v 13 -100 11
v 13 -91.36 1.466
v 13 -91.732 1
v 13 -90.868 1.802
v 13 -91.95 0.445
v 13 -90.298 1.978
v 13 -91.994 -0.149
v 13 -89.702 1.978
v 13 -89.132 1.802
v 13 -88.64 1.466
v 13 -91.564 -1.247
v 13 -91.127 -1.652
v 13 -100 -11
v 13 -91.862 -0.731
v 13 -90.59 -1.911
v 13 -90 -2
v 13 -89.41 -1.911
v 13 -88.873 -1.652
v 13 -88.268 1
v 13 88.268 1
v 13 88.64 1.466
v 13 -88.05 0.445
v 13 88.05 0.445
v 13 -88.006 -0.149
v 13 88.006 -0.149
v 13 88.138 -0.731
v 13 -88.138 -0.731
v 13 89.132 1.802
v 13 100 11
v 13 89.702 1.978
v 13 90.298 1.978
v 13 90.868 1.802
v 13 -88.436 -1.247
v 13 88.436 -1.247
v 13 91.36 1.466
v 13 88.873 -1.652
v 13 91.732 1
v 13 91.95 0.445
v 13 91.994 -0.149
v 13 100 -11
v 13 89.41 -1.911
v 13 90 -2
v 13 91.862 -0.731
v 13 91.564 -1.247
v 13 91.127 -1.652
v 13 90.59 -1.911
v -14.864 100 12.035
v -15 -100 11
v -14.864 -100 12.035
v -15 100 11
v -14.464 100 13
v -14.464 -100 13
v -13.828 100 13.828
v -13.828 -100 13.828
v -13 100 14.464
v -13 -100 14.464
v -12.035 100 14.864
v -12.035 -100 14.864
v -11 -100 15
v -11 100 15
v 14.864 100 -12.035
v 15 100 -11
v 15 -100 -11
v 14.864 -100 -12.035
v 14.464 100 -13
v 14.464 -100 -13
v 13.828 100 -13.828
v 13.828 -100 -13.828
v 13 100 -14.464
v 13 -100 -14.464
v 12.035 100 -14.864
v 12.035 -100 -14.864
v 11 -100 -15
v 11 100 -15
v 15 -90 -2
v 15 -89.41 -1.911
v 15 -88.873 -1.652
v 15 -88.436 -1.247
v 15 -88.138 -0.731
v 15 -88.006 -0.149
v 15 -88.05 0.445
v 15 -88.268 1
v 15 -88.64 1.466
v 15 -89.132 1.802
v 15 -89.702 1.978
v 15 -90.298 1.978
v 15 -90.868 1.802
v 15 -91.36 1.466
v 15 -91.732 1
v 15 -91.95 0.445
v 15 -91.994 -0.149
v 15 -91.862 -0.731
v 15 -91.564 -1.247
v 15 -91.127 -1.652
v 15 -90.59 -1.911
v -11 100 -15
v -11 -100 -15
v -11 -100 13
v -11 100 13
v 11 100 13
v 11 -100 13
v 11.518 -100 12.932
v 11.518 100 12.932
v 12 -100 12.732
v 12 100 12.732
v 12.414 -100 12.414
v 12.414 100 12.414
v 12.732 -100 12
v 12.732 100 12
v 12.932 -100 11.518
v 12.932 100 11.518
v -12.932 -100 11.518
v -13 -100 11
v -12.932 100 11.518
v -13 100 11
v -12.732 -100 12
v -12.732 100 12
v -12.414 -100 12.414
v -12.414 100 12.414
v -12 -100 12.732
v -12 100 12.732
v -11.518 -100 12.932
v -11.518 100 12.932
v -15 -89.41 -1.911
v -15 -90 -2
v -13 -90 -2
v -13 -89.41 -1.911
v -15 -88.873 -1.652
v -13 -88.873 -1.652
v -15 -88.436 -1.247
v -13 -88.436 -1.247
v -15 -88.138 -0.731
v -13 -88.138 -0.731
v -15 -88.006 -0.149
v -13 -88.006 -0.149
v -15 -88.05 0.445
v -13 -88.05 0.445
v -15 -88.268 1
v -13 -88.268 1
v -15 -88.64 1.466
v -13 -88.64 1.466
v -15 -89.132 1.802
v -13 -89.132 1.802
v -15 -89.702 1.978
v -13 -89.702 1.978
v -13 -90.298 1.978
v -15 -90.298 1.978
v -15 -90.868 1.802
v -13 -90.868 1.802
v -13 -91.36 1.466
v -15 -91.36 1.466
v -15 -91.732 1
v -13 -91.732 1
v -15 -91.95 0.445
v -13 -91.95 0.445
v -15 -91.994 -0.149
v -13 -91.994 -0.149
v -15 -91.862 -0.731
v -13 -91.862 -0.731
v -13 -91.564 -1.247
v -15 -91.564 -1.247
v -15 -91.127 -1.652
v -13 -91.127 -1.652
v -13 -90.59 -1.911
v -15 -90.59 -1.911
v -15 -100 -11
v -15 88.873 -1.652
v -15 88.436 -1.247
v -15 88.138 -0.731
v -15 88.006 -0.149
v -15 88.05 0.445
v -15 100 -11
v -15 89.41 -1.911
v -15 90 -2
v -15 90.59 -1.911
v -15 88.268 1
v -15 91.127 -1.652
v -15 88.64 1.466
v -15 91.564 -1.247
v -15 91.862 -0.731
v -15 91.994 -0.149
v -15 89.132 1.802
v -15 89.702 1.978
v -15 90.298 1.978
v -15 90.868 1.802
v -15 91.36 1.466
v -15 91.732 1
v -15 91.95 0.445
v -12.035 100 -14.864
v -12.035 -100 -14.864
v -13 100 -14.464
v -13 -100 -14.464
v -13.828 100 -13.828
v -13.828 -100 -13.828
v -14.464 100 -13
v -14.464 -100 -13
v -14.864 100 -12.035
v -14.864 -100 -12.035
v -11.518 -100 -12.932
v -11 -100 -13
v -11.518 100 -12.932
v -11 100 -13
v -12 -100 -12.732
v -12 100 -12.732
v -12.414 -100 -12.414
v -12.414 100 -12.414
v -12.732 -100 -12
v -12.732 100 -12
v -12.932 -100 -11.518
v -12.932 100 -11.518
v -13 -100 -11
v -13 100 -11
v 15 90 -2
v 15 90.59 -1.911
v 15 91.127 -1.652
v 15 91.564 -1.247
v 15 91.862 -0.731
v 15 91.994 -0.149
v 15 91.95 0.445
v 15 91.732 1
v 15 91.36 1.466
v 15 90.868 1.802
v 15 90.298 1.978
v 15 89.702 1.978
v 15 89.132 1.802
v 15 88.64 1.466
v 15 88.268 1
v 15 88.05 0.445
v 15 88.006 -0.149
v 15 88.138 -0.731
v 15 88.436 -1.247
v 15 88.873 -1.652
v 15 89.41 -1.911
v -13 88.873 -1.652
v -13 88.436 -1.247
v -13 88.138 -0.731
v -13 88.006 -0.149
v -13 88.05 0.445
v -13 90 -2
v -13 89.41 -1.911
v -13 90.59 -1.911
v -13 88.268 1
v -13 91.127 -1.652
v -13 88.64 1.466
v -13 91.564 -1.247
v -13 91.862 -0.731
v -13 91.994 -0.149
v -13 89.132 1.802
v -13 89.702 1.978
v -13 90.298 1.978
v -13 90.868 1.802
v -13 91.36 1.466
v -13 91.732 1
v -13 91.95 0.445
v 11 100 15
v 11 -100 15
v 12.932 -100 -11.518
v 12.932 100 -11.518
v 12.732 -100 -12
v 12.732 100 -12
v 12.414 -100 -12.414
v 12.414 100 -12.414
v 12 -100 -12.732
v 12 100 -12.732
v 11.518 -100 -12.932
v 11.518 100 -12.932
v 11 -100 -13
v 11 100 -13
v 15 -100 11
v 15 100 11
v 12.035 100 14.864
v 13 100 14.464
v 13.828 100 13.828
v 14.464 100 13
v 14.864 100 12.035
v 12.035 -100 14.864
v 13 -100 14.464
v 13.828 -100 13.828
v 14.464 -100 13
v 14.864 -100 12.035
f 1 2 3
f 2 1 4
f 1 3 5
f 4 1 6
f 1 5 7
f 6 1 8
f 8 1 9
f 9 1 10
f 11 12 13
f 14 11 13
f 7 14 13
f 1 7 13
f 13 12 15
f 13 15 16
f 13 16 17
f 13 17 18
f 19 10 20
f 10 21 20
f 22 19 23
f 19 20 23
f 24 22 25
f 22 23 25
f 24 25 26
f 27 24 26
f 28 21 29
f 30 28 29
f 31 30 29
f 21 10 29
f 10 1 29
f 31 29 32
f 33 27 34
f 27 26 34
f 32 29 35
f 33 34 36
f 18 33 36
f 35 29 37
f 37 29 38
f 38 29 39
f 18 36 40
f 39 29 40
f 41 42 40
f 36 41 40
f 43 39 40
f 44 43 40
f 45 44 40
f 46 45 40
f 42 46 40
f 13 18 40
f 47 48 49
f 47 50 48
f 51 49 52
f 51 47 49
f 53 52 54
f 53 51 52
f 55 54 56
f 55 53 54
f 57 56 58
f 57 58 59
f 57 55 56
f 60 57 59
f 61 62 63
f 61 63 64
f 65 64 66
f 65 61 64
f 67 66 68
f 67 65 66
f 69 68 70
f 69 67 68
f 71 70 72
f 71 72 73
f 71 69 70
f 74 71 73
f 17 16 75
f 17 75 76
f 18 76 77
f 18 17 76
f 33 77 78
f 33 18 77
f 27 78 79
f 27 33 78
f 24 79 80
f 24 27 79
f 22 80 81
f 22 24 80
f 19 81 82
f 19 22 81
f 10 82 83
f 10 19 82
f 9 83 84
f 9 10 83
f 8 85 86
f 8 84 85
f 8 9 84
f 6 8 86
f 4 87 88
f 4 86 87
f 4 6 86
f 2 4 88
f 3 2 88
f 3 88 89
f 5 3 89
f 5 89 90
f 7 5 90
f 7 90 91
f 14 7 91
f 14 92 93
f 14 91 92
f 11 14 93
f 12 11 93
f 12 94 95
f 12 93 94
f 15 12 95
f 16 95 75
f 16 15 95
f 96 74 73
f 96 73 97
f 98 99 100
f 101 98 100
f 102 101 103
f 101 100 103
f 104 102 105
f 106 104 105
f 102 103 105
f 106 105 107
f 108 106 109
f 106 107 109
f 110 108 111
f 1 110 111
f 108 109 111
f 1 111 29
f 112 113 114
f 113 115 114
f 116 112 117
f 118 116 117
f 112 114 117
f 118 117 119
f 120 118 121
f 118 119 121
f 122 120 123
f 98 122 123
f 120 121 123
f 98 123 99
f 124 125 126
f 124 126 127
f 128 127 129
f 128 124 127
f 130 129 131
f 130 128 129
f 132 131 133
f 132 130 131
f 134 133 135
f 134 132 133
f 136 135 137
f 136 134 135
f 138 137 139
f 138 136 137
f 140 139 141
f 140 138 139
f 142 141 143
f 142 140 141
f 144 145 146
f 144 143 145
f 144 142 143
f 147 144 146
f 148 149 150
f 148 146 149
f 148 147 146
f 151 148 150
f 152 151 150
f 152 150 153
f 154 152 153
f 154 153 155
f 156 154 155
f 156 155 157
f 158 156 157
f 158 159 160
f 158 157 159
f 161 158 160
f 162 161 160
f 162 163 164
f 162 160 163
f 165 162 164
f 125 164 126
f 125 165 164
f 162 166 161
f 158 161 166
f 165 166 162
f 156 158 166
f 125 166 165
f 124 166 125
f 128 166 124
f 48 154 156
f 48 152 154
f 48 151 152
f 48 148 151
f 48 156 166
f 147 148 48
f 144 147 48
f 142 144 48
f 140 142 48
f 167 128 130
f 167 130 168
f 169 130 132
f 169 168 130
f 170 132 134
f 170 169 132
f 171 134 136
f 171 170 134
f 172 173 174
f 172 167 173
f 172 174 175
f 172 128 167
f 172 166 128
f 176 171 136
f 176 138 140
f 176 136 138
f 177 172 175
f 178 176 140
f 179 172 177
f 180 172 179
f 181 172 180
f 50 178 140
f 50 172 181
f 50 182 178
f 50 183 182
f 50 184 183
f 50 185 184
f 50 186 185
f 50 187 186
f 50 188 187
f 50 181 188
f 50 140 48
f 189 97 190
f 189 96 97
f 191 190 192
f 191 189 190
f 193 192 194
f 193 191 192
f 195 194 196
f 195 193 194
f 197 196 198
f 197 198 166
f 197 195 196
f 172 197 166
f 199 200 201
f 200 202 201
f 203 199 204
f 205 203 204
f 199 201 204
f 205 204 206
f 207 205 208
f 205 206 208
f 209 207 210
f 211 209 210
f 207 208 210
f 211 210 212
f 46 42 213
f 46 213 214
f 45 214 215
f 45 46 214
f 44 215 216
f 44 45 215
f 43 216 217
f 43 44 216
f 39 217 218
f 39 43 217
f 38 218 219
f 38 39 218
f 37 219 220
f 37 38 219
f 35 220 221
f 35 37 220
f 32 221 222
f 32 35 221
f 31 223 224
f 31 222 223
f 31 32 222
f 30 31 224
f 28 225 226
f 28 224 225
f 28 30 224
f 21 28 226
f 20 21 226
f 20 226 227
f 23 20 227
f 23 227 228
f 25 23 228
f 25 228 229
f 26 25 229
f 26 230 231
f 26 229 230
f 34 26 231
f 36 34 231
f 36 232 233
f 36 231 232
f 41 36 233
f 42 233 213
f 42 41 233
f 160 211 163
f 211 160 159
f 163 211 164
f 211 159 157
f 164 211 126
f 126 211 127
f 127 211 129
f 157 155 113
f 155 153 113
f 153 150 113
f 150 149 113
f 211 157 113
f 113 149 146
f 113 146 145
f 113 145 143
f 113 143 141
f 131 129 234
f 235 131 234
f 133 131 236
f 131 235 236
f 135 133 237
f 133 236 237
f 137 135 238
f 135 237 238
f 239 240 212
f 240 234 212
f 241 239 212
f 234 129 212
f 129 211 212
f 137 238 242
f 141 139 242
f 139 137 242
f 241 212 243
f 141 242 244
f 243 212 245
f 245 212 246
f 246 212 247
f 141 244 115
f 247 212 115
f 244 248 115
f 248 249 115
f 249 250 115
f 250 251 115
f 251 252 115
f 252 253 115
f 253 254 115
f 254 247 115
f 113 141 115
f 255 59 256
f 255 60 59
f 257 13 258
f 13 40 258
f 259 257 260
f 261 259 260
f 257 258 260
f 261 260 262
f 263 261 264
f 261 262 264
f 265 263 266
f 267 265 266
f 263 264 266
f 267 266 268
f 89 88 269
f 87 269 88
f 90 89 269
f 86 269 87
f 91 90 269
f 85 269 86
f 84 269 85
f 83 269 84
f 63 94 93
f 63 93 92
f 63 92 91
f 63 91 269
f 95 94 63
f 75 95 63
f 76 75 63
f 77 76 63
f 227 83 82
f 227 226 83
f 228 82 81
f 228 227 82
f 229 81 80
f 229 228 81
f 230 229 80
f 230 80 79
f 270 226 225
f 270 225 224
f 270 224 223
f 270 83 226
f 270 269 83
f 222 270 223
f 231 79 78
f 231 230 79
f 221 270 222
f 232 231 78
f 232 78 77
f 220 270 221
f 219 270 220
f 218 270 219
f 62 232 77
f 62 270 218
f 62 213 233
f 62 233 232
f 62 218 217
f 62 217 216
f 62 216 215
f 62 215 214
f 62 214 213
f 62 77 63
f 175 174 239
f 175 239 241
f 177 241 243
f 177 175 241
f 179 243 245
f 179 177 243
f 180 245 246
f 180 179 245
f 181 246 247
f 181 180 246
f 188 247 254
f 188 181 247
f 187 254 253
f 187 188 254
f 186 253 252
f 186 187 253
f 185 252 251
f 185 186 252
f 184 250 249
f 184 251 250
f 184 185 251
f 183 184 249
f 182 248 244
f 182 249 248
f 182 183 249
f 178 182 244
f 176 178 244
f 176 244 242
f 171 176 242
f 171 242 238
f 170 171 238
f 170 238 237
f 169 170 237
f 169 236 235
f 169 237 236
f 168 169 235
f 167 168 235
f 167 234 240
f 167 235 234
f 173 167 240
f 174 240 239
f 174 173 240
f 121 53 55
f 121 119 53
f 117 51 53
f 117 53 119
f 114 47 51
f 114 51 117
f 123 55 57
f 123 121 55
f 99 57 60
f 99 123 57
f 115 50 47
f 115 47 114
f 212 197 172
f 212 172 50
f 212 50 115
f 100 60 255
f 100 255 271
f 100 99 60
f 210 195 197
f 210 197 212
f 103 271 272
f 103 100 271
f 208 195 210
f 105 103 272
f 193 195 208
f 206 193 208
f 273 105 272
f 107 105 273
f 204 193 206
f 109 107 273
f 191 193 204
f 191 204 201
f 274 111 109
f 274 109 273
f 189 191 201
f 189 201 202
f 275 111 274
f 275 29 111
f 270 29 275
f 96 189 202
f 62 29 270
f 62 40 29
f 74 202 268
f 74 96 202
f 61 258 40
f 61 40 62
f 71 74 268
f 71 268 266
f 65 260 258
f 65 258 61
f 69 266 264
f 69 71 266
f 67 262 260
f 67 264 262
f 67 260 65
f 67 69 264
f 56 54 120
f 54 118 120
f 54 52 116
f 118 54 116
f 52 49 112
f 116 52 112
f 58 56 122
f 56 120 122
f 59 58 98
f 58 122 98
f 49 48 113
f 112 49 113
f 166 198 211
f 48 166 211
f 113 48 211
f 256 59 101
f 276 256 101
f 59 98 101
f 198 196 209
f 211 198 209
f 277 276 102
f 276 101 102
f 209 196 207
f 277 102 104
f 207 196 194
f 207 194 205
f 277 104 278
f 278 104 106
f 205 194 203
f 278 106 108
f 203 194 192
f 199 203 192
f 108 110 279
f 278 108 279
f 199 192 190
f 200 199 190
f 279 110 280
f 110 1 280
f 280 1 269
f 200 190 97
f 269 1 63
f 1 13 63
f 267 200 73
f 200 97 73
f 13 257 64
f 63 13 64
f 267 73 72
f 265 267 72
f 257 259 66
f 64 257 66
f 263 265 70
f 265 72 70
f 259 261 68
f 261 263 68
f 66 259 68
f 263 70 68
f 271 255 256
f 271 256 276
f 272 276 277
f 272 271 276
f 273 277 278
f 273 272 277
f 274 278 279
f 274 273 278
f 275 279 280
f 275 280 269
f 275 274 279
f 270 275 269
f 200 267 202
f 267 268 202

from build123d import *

# Parameters (mm, degrees)
EXTRUDE_1_DEPTH          = 100
CUT_EXTRUDE_1_DEPTH      = 103.225241501
CUT_EXTRUDE_1_DEPTH_BACK = 103.225241501
SKETCH_2_R               = 2


with BuildPart() as part:
    # 草图1 → 凸台-拉伸1 (new, symmetric)
    with BuildSketch(Plane(origin=(0, 0, 0), x_dir=(1, 0, 0), z_dir=(0, 1, 0))):
        with BuildLine():
            Line((-11, -15), (11, -15))
            ThreePointArc((11, -15), (13.828427125, -13.828427125), (15, -11))
            Line((15, -11), (15, 11))
            ThreePointArc((15, 11), (13.828427125, 13.828427125), (11, 15))
            Line((11, 15), (-11, 15))
            ThreePointArc((-11, 15), (-13.828427125, 13.828427125), (-15, 11))
            Line((-15, 11), (-15, -11))
            ThreePointArc((-15, -11), (-13.828427125, -13.828427125), (-11, -15))
        make_face()
        with BuildLine():
            Line((-11, -13), (11, -13))
            ThreePointArc((11, -13), (12.414213562, -12.414213562), (13, -11))
            Line((13, -11), (13, 11))
            ThreePointArc((13, 11), (12.414213562, 12.414213562), (11, 13))
            Line((11, 13), (-11, 13))
            ThreePointArc((-11, 13), (-12.414213562, 12.414213562), (-13, 11))
            Line((-13, 11), (-13, -11))
            ThreePointArc((-13, -11), (-12.414213562, -12.414213562), (-11, -13))
        make_face(mode=Mode.SUBTRACT)
    extrude(amount=EXTRUDE_1_DEPTH, both=True)

    # 草图2 → 切除-拉伸1 (cut, two sides: drawn at the far end of the back side and taken through both)
    with BuildSketch(Plane(origin=(0, 0, 0), x_dir=(0, 0, -1), z_dir=(1, 0, 0)).offset(-CUT_EXTRUDE_1_DEPTH_BACK)):
        with Locations((0, 90)):
            Circle(SKETCH_2_R)
        with Locations((0, -90)):
            Circle(SKETCH_2_R)
    extrude(amount=CUT_EXTRUDE_1_DEPTH + CUT_EXTRUDE_1_DEPTH_BACK, mode=Mode.SUBTRACT)


solid = part.part
